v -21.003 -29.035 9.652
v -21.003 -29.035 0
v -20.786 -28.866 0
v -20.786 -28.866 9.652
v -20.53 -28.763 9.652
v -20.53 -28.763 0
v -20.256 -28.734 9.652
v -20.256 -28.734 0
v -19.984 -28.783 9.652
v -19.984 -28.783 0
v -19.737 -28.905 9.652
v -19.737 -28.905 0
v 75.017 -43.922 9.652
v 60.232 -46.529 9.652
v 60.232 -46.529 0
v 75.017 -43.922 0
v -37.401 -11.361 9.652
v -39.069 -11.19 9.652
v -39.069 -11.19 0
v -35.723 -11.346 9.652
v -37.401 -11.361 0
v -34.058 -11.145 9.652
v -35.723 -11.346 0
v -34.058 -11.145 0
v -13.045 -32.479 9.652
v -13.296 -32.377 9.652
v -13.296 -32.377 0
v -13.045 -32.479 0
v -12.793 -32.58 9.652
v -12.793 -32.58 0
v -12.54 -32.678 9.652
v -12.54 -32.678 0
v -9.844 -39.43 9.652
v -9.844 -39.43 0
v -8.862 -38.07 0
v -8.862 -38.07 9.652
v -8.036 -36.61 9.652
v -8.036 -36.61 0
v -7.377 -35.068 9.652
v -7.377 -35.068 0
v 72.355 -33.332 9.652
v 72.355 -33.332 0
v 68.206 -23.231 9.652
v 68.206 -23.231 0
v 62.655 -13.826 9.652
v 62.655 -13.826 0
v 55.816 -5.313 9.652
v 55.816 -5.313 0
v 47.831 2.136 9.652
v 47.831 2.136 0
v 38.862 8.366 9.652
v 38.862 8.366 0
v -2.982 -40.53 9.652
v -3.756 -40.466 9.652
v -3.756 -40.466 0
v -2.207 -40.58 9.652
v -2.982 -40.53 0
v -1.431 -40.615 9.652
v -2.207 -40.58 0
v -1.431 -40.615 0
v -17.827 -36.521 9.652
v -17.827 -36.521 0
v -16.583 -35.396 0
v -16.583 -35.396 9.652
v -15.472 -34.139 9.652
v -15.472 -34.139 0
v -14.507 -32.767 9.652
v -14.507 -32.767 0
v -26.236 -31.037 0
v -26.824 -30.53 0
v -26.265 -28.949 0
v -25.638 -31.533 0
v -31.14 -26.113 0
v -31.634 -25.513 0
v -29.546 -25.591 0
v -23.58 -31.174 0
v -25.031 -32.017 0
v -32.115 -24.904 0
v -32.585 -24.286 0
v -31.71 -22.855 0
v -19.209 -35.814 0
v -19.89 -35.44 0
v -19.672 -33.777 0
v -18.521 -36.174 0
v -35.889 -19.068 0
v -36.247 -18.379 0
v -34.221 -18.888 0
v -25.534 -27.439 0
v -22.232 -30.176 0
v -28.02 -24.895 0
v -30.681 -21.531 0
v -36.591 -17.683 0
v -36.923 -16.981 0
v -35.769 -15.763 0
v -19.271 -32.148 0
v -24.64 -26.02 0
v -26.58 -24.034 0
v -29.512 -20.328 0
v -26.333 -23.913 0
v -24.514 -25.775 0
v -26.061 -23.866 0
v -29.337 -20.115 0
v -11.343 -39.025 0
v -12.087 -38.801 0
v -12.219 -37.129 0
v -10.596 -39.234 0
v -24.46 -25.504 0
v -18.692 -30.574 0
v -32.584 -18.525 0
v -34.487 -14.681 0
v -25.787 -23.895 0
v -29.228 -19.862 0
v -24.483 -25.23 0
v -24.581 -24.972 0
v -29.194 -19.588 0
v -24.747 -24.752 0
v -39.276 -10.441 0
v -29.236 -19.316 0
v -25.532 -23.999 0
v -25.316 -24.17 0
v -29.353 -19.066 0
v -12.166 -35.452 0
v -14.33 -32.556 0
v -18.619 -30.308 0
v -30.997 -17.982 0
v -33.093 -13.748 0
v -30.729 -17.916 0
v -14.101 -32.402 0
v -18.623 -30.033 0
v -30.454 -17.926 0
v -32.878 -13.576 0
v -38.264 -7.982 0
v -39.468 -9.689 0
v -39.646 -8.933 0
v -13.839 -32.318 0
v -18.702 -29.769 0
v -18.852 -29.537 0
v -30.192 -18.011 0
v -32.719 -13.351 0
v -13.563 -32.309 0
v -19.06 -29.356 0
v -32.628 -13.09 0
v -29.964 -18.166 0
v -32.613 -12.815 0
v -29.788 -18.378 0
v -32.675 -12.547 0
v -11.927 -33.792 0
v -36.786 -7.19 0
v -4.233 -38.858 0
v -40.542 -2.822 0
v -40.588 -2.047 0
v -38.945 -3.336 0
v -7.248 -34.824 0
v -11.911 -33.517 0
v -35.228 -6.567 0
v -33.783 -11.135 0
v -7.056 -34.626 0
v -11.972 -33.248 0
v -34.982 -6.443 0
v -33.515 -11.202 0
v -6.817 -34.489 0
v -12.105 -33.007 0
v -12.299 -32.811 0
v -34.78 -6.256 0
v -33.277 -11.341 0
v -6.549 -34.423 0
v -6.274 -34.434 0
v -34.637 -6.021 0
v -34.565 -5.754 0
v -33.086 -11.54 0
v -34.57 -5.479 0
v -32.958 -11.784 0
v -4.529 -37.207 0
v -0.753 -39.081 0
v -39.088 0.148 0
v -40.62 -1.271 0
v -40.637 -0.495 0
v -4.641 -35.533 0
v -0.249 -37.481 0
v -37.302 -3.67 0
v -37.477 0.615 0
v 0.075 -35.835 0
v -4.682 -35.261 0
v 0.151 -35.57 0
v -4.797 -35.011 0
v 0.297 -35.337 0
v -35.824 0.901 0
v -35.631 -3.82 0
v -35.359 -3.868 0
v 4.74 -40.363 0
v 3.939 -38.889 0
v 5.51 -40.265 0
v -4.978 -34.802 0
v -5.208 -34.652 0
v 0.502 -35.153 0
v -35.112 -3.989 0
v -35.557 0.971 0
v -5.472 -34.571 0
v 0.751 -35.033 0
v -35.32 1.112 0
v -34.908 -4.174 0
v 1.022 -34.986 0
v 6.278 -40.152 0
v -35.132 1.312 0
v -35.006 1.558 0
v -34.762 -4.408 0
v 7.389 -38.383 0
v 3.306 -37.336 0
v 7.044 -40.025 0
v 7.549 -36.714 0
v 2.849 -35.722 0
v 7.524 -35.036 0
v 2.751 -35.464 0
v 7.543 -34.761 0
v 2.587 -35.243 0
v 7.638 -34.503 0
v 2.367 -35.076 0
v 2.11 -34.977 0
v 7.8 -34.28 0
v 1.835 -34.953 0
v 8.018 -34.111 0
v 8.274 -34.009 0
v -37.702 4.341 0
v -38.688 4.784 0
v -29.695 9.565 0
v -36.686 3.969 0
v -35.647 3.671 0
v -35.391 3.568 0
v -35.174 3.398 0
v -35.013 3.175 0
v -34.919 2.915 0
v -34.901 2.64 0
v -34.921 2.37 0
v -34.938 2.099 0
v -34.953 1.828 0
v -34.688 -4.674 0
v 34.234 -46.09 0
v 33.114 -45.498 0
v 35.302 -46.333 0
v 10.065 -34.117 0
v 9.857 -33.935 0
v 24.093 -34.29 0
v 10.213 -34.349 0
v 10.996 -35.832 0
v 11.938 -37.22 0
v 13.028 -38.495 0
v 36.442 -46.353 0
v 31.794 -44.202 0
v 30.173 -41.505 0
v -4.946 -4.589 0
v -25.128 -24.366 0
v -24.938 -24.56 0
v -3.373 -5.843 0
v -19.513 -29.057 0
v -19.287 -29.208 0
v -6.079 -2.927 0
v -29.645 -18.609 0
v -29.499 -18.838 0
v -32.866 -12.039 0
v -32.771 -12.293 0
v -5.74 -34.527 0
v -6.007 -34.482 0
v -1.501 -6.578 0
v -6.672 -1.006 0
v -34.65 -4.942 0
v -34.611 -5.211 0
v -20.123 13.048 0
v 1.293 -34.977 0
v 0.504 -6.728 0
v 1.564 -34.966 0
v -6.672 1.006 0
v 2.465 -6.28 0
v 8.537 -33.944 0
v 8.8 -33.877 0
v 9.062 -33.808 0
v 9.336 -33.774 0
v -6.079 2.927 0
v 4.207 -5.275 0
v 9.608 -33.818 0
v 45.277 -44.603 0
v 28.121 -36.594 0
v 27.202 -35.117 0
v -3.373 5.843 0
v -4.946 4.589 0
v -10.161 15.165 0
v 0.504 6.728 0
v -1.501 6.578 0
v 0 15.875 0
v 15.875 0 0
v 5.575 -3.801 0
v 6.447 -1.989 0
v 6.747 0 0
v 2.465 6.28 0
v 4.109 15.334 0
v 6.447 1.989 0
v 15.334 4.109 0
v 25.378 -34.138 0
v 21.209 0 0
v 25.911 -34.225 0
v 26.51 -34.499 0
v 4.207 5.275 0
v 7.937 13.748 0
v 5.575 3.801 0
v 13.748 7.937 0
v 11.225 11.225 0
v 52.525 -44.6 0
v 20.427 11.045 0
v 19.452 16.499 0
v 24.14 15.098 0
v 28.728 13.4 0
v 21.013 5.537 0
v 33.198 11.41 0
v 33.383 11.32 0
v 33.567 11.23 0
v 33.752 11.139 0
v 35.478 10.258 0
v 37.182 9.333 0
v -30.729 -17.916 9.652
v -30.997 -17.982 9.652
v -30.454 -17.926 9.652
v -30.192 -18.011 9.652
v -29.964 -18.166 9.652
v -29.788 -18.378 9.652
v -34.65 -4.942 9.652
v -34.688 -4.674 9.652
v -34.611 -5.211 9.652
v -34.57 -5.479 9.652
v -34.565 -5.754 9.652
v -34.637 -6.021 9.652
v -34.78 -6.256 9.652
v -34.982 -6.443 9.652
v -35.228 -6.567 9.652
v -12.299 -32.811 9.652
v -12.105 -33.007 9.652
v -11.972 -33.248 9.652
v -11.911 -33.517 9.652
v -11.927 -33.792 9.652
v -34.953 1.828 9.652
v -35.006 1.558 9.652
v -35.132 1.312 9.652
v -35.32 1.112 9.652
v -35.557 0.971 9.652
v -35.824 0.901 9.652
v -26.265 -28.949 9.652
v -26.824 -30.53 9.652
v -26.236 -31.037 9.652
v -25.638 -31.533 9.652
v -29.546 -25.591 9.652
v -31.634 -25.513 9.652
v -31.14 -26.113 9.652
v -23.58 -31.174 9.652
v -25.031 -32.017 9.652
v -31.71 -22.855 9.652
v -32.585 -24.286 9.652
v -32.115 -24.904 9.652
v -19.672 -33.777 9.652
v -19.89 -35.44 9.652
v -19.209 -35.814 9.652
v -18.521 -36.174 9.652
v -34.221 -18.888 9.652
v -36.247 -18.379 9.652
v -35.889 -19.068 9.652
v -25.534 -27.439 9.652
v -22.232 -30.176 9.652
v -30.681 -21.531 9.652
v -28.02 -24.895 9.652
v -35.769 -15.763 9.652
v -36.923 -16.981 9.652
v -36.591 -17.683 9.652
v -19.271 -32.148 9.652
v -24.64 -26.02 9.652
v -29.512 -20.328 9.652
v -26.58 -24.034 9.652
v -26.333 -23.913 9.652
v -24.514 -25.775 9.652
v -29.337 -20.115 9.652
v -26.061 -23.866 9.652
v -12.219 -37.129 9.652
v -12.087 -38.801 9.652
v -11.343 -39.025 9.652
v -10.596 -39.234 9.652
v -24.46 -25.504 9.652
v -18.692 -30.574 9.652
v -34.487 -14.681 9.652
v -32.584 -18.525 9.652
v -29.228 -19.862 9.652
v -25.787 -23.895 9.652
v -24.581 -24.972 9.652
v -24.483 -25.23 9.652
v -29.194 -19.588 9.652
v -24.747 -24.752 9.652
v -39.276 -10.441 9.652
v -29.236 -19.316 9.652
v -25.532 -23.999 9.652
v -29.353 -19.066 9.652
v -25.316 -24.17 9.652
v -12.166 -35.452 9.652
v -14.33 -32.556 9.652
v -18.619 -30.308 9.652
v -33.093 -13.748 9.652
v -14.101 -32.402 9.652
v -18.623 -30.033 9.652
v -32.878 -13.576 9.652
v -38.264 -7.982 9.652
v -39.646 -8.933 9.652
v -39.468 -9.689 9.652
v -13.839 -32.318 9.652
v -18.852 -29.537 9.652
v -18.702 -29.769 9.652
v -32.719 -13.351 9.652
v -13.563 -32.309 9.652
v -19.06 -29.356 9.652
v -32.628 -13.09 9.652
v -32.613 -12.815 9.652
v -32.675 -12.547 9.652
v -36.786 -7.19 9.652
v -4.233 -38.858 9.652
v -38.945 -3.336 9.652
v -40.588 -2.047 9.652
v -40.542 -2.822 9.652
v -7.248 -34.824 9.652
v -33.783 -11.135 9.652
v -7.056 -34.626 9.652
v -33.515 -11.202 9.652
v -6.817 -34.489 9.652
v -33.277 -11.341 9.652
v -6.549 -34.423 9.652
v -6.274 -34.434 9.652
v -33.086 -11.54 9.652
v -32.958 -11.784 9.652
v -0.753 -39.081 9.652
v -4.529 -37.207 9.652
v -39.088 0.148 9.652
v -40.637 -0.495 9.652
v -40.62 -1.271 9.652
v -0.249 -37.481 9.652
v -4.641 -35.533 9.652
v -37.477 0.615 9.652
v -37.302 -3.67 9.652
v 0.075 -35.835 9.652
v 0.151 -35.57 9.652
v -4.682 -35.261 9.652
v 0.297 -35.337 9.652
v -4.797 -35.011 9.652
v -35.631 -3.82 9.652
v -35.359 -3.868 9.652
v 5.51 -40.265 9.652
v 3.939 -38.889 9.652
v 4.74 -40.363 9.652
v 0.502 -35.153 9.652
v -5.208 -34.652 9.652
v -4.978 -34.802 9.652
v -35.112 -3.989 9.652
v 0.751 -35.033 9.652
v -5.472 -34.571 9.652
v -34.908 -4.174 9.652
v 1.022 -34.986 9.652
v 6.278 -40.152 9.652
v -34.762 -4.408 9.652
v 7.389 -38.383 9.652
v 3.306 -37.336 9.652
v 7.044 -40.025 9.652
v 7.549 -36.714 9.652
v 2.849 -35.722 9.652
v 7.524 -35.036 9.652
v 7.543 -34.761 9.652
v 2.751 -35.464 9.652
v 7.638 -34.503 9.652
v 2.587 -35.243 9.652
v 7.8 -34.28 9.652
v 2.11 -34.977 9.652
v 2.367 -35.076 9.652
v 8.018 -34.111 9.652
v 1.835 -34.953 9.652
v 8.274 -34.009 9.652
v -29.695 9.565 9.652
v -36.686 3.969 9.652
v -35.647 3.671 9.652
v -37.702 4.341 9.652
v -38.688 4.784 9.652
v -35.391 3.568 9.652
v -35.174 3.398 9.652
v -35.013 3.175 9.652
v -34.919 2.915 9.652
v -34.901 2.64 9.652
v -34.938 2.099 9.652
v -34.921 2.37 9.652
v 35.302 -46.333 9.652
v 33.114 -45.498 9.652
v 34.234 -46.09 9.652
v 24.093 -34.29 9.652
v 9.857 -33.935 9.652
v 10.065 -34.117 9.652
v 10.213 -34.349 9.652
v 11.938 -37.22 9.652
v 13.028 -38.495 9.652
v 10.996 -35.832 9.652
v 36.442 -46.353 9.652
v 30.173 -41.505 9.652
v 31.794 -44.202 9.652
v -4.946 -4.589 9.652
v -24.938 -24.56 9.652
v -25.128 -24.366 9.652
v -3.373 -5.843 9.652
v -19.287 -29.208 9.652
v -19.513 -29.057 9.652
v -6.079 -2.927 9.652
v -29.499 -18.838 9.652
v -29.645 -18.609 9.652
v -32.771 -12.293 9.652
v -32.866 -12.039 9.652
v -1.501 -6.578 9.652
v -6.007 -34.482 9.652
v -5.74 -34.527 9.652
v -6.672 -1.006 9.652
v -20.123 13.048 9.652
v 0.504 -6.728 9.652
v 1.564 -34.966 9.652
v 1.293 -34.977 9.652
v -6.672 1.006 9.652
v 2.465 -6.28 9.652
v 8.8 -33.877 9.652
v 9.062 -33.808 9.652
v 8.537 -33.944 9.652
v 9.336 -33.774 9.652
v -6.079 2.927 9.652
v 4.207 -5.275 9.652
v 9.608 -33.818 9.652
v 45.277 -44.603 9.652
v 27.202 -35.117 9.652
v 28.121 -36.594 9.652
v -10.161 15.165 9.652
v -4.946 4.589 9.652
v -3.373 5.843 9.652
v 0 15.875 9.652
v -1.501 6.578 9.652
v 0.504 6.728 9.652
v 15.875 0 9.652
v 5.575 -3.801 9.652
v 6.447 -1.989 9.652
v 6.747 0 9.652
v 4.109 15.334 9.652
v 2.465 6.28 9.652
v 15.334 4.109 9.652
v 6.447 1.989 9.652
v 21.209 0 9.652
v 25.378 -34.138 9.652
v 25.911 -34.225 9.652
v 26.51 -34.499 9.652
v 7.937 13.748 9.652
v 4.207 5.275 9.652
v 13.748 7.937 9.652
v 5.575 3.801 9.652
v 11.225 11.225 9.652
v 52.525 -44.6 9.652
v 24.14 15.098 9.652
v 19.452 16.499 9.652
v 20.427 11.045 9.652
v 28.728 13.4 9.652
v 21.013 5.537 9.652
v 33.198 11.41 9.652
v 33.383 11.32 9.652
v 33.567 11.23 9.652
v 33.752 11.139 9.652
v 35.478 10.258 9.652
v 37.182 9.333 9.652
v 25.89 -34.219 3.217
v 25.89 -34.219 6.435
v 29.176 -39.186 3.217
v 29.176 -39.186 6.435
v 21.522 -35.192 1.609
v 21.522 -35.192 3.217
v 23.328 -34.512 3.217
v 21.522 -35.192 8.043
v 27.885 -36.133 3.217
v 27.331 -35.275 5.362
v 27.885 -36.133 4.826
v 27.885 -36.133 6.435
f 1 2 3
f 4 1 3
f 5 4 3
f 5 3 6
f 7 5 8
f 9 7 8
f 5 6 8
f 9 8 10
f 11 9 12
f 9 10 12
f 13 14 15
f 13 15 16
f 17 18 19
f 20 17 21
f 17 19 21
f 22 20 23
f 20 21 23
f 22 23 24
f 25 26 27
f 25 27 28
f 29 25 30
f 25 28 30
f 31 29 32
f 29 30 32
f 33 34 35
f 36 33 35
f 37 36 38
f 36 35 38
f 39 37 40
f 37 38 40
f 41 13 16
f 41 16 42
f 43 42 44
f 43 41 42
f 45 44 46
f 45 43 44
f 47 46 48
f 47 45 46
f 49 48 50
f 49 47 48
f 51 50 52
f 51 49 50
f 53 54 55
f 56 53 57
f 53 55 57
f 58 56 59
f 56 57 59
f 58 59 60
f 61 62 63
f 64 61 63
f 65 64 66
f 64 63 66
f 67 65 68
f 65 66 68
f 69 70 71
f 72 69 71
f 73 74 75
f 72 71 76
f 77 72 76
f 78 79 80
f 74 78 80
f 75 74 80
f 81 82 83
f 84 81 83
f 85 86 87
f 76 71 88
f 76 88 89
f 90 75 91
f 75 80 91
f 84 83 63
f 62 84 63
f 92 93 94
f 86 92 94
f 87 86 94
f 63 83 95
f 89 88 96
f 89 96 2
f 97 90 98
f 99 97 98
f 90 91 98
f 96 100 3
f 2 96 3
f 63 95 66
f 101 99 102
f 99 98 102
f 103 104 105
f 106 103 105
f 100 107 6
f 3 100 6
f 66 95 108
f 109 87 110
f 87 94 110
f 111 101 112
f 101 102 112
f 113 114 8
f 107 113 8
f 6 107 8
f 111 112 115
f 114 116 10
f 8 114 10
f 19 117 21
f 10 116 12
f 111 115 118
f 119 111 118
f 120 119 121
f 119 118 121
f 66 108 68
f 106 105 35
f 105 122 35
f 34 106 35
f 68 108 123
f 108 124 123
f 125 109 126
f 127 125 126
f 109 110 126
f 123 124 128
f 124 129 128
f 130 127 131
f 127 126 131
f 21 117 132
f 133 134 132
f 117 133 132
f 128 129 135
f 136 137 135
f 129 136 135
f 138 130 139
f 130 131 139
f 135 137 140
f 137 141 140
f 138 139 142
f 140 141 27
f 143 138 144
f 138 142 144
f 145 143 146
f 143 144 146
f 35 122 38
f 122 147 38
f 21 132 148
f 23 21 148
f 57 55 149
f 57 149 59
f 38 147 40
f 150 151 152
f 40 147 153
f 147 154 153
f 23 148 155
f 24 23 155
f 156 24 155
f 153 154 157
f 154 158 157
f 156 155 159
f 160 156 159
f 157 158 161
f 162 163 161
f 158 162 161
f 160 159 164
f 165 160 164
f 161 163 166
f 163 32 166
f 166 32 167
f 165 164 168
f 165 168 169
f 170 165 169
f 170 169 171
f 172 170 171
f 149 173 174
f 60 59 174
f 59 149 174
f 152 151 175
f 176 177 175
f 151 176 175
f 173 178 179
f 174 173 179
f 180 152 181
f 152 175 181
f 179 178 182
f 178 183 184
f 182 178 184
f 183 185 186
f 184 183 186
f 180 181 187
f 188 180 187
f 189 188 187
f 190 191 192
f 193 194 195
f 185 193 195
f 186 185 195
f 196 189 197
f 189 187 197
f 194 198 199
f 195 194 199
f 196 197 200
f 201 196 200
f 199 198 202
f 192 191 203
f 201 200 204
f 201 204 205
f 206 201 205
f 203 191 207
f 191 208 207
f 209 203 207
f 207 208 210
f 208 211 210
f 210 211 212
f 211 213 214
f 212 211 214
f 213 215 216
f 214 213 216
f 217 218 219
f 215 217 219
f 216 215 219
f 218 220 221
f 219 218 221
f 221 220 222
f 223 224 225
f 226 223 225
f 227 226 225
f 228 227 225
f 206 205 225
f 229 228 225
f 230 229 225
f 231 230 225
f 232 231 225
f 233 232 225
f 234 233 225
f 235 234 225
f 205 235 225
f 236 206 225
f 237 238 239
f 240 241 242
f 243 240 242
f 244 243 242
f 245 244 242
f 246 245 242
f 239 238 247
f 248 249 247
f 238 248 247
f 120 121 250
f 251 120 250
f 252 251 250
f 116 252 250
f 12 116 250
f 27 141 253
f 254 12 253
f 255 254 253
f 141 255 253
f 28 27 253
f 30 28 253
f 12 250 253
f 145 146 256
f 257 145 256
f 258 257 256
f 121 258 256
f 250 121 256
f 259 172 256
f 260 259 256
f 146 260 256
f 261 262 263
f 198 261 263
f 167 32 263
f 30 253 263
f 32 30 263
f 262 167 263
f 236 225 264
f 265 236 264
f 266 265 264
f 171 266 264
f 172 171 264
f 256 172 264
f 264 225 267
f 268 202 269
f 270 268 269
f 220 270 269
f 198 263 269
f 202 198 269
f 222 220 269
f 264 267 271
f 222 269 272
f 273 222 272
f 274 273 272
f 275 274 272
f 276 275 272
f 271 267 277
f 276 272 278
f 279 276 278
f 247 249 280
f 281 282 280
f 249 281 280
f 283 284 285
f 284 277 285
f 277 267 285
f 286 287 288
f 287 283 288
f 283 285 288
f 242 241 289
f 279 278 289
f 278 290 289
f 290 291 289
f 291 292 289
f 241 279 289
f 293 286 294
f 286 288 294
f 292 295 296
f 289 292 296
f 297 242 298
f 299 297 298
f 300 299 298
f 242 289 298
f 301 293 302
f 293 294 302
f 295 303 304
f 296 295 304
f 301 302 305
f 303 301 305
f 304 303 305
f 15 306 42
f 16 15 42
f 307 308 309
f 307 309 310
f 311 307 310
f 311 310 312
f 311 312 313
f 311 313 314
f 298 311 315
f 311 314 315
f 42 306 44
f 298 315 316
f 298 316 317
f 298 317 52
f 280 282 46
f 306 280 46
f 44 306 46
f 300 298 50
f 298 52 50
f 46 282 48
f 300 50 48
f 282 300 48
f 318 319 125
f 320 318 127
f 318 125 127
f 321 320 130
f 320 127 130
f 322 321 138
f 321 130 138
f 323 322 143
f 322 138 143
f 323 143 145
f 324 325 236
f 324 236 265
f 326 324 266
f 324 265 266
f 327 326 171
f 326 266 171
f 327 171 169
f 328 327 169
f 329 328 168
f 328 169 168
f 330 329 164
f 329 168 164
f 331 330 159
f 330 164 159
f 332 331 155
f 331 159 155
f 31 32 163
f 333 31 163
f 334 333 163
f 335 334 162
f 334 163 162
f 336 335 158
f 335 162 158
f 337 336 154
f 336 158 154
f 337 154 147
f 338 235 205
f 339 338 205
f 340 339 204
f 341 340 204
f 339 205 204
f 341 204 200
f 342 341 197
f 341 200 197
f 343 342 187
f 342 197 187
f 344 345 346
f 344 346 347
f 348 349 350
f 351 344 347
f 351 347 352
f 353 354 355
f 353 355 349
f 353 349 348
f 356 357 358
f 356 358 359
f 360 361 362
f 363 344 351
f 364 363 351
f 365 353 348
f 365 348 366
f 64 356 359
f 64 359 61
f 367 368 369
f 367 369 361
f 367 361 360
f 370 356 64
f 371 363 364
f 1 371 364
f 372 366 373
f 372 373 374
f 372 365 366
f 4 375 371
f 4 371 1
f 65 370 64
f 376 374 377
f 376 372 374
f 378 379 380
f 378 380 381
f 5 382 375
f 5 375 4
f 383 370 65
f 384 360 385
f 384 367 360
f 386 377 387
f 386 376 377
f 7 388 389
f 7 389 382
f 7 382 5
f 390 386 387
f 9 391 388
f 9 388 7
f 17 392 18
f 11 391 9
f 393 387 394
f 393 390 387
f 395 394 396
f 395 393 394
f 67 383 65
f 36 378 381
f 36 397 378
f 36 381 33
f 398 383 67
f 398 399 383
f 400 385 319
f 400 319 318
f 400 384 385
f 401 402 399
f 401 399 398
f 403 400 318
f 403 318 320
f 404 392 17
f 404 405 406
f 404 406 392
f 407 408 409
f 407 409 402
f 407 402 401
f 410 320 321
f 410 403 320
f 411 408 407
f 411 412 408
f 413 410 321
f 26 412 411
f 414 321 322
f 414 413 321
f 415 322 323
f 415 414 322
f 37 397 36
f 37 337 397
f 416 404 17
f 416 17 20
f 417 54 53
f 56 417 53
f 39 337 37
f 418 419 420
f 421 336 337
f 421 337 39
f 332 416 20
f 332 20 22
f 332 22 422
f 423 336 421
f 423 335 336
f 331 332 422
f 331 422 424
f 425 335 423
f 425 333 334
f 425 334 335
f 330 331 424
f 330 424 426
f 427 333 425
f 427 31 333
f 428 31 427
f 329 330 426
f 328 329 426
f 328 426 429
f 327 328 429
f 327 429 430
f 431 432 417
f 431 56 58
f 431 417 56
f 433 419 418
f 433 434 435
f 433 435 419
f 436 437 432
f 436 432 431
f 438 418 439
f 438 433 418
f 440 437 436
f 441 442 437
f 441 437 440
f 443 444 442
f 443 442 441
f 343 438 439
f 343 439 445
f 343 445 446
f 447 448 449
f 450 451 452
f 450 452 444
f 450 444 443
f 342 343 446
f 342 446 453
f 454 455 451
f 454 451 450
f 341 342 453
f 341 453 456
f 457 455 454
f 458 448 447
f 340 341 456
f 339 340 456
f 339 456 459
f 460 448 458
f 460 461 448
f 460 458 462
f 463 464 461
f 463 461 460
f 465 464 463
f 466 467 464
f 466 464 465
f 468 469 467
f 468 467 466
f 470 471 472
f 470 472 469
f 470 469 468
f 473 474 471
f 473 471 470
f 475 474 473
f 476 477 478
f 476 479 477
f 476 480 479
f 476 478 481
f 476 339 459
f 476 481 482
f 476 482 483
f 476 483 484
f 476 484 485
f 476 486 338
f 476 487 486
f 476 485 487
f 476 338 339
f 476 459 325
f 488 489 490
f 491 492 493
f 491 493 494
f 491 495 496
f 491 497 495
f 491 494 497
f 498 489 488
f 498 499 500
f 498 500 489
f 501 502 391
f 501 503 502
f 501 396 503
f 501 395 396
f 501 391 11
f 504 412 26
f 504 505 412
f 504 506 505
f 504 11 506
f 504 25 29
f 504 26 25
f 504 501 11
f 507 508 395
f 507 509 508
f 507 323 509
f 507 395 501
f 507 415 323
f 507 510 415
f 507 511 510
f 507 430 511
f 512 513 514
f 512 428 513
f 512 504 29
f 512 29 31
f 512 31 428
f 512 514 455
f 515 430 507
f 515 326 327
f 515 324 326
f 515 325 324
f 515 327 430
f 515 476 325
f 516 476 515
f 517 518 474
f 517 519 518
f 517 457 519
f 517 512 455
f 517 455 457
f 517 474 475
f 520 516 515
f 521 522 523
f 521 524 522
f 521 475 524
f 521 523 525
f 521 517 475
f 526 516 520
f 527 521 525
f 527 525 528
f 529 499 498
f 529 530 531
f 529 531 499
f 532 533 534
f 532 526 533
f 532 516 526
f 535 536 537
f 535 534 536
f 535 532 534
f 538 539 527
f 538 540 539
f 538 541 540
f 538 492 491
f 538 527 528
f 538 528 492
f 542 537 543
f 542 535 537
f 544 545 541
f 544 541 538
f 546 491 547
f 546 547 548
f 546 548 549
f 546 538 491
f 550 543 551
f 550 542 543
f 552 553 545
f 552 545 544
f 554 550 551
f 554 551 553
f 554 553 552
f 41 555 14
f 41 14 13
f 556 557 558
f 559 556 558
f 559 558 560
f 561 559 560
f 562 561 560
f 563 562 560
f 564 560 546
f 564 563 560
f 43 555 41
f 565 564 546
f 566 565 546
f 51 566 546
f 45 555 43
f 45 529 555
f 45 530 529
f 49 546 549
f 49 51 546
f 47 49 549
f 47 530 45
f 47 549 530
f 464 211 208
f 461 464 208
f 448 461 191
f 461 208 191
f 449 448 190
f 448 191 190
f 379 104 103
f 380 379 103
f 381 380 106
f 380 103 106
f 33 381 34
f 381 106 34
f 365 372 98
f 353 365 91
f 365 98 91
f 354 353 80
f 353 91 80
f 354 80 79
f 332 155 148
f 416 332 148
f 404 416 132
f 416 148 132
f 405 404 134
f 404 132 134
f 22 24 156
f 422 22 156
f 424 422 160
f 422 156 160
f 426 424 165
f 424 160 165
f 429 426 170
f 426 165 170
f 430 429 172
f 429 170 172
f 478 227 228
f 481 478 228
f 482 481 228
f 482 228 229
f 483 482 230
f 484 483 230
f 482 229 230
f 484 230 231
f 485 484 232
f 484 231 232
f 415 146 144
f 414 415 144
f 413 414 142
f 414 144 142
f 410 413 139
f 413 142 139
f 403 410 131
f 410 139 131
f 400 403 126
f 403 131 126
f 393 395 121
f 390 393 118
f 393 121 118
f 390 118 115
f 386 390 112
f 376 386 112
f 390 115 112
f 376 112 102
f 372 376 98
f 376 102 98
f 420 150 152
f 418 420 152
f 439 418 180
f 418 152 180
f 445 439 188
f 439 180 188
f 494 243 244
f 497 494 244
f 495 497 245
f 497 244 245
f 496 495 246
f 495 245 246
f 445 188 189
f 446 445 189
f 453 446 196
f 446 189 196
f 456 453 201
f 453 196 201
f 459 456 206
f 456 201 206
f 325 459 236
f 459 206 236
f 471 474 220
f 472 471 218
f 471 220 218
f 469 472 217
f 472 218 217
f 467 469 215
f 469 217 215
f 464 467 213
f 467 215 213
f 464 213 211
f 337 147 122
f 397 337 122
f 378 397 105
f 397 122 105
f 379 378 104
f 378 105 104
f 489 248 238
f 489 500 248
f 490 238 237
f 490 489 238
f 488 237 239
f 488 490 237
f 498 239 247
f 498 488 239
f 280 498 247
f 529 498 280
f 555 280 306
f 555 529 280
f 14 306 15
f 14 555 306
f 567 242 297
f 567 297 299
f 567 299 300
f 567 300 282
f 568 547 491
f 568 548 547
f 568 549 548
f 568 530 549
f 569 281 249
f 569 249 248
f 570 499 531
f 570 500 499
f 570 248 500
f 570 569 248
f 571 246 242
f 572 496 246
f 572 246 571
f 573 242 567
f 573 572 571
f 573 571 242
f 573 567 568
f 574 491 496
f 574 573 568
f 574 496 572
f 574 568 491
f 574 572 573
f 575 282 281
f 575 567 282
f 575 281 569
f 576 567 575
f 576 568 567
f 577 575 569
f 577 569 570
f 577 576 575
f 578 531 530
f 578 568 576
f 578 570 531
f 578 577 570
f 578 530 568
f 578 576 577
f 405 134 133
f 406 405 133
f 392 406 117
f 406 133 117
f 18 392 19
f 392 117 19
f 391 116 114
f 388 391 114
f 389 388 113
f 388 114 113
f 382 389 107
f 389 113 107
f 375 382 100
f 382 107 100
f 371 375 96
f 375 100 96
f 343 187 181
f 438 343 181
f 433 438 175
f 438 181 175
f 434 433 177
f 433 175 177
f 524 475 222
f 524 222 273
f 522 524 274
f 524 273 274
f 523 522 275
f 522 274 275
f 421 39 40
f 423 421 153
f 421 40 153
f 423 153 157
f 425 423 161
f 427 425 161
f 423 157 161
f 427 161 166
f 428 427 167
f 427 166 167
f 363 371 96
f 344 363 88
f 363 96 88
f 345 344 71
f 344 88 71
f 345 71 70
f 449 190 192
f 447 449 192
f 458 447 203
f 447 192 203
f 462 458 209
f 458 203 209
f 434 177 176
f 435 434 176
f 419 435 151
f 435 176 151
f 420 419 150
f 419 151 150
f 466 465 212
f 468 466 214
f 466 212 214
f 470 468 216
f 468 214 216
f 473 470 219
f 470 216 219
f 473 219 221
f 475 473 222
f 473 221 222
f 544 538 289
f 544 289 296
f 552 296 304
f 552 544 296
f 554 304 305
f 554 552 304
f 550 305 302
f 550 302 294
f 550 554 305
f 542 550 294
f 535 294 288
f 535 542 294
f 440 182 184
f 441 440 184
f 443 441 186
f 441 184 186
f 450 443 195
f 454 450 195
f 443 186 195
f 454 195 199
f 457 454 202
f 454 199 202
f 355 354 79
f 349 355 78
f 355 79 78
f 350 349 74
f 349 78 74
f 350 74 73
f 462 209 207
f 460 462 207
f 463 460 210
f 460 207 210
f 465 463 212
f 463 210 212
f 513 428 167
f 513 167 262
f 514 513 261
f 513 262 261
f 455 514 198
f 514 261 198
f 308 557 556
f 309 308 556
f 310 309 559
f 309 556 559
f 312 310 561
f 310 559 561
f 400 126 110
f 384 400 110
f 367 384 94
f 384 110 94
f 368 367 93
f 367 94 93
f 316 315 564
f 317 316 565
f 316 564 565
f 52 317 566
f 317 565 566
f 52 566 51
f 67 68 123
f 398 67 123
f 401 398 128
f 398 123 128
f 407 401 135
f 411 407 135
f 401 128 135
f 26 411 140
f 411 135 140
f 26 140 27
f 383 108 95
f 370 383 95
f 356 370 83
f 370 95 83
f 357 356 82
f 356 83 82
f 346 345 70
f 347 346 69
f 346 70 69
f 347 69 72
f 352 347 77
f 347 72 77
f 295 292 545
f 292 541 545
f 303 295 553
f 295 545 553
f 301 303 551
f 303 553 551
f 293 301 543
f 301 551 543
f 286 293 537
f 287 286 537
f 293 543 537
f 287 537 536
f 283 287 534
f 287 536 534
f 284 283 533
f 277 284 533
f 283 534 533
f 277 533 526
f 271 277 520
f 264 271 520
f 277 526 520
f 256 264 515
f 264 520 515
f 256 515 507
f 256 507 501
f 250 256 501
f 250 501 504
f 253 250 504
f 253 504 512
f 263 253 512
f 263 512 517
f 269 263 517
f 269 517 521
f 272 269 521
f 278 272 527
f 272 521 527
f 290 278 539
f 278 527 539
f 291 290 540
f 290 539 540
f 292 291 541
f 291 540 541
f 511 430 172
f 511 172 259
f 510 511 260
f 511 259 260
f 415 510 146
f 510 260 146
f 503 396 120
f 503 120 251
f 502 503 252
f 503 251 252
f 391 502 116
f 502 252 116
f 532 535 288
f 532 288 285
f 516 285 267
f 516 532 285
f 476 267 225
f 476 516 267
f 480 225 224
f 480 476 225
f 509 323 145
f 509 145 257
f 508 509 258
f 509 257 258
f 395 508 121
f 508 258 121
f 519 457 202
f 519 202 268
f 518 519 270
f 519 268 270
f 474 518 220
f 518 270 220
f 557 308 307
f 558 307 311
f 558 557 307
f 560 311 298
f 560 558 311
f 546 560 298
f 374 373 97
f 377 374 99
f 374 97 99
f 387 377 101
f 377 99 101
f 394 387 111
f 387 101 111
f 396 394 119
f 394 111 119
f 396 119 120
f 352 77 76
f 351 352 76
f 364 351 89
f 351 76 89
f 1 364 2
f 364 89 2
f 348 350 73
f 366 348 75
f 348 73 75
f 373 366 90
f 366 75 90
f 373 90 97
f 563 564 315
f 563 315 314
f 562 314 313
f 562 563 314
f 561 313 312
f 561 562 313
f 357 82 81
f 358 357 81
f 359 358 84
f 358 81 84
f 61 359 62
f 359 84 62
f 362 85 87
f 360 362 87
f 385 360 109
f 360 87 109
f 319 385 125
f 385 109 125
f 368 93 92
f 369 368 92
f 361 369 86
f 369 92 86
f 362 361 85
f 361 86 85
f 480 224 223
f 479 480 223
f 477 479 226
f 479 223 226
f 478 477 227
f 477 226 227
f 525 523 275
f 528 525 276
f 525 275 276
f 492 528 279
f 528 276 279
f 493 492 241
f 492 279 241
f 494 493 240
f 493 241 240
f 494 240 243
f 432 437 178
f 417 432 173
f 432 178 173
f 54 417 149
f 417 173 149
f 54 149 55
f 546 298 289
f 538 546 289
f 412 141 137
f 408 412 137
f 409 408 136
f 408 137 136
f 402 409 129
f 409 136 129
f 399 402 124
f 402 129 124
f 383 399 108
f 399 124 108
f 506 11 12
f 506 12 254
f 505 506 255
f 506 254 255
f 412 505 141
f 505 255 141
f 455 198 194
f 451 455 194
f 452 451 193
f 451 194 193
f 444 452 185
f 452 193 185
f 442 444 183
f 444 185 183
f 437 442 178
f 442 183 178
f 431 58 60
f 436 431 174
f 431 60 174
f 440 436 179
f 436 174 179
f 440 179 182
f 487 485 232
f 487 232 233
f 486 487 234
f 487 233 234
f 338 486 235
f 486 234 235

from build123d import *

# Parameters (mm, degrees)
SKETCH3_R           = 40.64
GEARBODY_DEPTH      = 9.652
TOOTHCUT_DEPTH      = 10.652
CIRPATTERN1_COUNT   = 30
BOREDIA_R           = 6.746875
BORE_DEPTH          = 12700
CUT_EXTRUDE1_DEPTH  = 10.652
BOSS_EXTRUDE1_DEPTH = 9.652
CUT_EXTRUDE2_DEPTH  = 10.6520001


with BuildPart() as part:
    # Sketch3 → gearBody (new body)
    with BuildSketch(Plane.XY):
        Circle(SKETCH3_R)
    extrude(amount=GEARBODY_DEPTH)

    # Sketch2 → toothCut (cut, through all)
    with BuildSketch(Plane.XY):
        with BuildLine():
            ThreePointArc((34.901466352, -2.640387833), (34.929801576, -2.234493965), (34.953416534, -1.828298136))
            ThreePointArc((34.953416534, -1.828298136), (35.218972856, -1.205360668), (35.823821616, -0.900845929))
            ThreePointArc((35.823821616, -0.900845929), (41.902420255, 1.180053047), (46.567899911, 5.597382731))
            ThreePointArc((46.567899911, 5.597382731), (46.807414621, -2.994316622), (45.4750933, -11.485464069))
            ThreePointArc((45.4750933, -11.485464069), (41.410501506, -6.509663078), (35.646600115, -3.671187658))
            ThreePointArc((35.646600115, -3.671187658), (35.08548304, -3.292084932), (34.901466352, -2.640387833))
        make_face()
    toothcut = extrude(amount=TOOTHCUT_DEPTH, mode=Mode.SUBTRACT)

    # CirPattern1: toothCut ×30 about axis
    cirpattern1_axis = Axis((0, 0, 0), (0, 0, 1))
    for i in range(1, CIRPATTERN1_COUNT):
        add(toothcut.rotate(cirpattern1_axis, i * 360 / CIRPATTERN1_COUNT), mode=Mode.SUBTRACT)

    # boreDia → bore (cut, symmetric)
    with BuildSketch(Plane.XY):
        Circle(BOREDIA_R)
    extrude(amount=BORE_DEPTH, both=True, mode=Mode.SUBTRACT)

    # Sketch4 → Cut-Extrude1 (cut, through all)
    with BuildSketch(Plane.XY.offset(9.652)):
        with BuildLine():
            ThreePointArc((-41.719518102, 6.584225456), (0, 19.0246), (41.719518102, 6.584225456))
            ThreePointArc((41.719518102, 6.584225456), (0, 42.235887767), (-41.719518102, 6.584225456))
        make_face()
    extrude(amount=-CUT_EXTRUDE1_DEPTH, mode=Mode.SUBTRACT)

    # Sketch5 → Boss-Extrude1 (add)
    with BuildSketch(Plane.XY.offset(9.652)):
        with BuildLine():
            Line((0, 19.0246), (21.516273518, 3.717628196))
            Line((21.516273518, 3.717628196), (8.960832095, -26.928019276))
            Line((8.960832095, -26.928019276), (13.028048789, -38.495188592))
            add(Edge.make_bspline(
                [(13.028048789, -38.495188592), (20.557027875, -35.948016391), (26.651698234, -31.725988422), (34.665054684, -56.754549328), (39.534520581, -39.016908481), (60.232048781, -46.529464697)],
                knots=[0, 0, 0, 0, 0.11851508, 0.21851508, 1, 1, 1, 1], degree=3))
            Line((60.232048781, -46.529464697), (75.017336663, -43.922419525))
            ThreePointArc((75.017336663, -43.922419525), (48.964089053, 1.203129037), (0, 19.0246))
        make_face()
    extrude(amount=-BOSS_EXTRUDE1_DEPTH)

    # Sketch6 → Cut-Extrude2 (cut, through all)
    with BuildSketch(Plane.XY.offset(9.652)):
        with BuildLine():
            Line((-41.299293436, 3.074737332), (-42.33973186, 6.17390379))
            ThreePointArc((-42.33973186, 6.17390379), (-12.554296612, 17.982944317), (19.452320435, 16.499011635))
            ThreePointArc((19.452320435, 16.499011635), (20.76859248, 8.296133256), (21.209, 0))
            Line((21.209, 0), (15.875, 0))
            ThreePointArc((15.875, 0), (11.225320151, 11.225320151), (0, 15.875))
            ThreePointArc((0, 15.875), (-21.618732402, 12.601566537), (-41.299293436, 3.074737332))
        make_face()
    extrude(amount=-CUT_EXTRUDE2_DEPTH, mode=Mode.SUBTRACT)


solid = part.part
